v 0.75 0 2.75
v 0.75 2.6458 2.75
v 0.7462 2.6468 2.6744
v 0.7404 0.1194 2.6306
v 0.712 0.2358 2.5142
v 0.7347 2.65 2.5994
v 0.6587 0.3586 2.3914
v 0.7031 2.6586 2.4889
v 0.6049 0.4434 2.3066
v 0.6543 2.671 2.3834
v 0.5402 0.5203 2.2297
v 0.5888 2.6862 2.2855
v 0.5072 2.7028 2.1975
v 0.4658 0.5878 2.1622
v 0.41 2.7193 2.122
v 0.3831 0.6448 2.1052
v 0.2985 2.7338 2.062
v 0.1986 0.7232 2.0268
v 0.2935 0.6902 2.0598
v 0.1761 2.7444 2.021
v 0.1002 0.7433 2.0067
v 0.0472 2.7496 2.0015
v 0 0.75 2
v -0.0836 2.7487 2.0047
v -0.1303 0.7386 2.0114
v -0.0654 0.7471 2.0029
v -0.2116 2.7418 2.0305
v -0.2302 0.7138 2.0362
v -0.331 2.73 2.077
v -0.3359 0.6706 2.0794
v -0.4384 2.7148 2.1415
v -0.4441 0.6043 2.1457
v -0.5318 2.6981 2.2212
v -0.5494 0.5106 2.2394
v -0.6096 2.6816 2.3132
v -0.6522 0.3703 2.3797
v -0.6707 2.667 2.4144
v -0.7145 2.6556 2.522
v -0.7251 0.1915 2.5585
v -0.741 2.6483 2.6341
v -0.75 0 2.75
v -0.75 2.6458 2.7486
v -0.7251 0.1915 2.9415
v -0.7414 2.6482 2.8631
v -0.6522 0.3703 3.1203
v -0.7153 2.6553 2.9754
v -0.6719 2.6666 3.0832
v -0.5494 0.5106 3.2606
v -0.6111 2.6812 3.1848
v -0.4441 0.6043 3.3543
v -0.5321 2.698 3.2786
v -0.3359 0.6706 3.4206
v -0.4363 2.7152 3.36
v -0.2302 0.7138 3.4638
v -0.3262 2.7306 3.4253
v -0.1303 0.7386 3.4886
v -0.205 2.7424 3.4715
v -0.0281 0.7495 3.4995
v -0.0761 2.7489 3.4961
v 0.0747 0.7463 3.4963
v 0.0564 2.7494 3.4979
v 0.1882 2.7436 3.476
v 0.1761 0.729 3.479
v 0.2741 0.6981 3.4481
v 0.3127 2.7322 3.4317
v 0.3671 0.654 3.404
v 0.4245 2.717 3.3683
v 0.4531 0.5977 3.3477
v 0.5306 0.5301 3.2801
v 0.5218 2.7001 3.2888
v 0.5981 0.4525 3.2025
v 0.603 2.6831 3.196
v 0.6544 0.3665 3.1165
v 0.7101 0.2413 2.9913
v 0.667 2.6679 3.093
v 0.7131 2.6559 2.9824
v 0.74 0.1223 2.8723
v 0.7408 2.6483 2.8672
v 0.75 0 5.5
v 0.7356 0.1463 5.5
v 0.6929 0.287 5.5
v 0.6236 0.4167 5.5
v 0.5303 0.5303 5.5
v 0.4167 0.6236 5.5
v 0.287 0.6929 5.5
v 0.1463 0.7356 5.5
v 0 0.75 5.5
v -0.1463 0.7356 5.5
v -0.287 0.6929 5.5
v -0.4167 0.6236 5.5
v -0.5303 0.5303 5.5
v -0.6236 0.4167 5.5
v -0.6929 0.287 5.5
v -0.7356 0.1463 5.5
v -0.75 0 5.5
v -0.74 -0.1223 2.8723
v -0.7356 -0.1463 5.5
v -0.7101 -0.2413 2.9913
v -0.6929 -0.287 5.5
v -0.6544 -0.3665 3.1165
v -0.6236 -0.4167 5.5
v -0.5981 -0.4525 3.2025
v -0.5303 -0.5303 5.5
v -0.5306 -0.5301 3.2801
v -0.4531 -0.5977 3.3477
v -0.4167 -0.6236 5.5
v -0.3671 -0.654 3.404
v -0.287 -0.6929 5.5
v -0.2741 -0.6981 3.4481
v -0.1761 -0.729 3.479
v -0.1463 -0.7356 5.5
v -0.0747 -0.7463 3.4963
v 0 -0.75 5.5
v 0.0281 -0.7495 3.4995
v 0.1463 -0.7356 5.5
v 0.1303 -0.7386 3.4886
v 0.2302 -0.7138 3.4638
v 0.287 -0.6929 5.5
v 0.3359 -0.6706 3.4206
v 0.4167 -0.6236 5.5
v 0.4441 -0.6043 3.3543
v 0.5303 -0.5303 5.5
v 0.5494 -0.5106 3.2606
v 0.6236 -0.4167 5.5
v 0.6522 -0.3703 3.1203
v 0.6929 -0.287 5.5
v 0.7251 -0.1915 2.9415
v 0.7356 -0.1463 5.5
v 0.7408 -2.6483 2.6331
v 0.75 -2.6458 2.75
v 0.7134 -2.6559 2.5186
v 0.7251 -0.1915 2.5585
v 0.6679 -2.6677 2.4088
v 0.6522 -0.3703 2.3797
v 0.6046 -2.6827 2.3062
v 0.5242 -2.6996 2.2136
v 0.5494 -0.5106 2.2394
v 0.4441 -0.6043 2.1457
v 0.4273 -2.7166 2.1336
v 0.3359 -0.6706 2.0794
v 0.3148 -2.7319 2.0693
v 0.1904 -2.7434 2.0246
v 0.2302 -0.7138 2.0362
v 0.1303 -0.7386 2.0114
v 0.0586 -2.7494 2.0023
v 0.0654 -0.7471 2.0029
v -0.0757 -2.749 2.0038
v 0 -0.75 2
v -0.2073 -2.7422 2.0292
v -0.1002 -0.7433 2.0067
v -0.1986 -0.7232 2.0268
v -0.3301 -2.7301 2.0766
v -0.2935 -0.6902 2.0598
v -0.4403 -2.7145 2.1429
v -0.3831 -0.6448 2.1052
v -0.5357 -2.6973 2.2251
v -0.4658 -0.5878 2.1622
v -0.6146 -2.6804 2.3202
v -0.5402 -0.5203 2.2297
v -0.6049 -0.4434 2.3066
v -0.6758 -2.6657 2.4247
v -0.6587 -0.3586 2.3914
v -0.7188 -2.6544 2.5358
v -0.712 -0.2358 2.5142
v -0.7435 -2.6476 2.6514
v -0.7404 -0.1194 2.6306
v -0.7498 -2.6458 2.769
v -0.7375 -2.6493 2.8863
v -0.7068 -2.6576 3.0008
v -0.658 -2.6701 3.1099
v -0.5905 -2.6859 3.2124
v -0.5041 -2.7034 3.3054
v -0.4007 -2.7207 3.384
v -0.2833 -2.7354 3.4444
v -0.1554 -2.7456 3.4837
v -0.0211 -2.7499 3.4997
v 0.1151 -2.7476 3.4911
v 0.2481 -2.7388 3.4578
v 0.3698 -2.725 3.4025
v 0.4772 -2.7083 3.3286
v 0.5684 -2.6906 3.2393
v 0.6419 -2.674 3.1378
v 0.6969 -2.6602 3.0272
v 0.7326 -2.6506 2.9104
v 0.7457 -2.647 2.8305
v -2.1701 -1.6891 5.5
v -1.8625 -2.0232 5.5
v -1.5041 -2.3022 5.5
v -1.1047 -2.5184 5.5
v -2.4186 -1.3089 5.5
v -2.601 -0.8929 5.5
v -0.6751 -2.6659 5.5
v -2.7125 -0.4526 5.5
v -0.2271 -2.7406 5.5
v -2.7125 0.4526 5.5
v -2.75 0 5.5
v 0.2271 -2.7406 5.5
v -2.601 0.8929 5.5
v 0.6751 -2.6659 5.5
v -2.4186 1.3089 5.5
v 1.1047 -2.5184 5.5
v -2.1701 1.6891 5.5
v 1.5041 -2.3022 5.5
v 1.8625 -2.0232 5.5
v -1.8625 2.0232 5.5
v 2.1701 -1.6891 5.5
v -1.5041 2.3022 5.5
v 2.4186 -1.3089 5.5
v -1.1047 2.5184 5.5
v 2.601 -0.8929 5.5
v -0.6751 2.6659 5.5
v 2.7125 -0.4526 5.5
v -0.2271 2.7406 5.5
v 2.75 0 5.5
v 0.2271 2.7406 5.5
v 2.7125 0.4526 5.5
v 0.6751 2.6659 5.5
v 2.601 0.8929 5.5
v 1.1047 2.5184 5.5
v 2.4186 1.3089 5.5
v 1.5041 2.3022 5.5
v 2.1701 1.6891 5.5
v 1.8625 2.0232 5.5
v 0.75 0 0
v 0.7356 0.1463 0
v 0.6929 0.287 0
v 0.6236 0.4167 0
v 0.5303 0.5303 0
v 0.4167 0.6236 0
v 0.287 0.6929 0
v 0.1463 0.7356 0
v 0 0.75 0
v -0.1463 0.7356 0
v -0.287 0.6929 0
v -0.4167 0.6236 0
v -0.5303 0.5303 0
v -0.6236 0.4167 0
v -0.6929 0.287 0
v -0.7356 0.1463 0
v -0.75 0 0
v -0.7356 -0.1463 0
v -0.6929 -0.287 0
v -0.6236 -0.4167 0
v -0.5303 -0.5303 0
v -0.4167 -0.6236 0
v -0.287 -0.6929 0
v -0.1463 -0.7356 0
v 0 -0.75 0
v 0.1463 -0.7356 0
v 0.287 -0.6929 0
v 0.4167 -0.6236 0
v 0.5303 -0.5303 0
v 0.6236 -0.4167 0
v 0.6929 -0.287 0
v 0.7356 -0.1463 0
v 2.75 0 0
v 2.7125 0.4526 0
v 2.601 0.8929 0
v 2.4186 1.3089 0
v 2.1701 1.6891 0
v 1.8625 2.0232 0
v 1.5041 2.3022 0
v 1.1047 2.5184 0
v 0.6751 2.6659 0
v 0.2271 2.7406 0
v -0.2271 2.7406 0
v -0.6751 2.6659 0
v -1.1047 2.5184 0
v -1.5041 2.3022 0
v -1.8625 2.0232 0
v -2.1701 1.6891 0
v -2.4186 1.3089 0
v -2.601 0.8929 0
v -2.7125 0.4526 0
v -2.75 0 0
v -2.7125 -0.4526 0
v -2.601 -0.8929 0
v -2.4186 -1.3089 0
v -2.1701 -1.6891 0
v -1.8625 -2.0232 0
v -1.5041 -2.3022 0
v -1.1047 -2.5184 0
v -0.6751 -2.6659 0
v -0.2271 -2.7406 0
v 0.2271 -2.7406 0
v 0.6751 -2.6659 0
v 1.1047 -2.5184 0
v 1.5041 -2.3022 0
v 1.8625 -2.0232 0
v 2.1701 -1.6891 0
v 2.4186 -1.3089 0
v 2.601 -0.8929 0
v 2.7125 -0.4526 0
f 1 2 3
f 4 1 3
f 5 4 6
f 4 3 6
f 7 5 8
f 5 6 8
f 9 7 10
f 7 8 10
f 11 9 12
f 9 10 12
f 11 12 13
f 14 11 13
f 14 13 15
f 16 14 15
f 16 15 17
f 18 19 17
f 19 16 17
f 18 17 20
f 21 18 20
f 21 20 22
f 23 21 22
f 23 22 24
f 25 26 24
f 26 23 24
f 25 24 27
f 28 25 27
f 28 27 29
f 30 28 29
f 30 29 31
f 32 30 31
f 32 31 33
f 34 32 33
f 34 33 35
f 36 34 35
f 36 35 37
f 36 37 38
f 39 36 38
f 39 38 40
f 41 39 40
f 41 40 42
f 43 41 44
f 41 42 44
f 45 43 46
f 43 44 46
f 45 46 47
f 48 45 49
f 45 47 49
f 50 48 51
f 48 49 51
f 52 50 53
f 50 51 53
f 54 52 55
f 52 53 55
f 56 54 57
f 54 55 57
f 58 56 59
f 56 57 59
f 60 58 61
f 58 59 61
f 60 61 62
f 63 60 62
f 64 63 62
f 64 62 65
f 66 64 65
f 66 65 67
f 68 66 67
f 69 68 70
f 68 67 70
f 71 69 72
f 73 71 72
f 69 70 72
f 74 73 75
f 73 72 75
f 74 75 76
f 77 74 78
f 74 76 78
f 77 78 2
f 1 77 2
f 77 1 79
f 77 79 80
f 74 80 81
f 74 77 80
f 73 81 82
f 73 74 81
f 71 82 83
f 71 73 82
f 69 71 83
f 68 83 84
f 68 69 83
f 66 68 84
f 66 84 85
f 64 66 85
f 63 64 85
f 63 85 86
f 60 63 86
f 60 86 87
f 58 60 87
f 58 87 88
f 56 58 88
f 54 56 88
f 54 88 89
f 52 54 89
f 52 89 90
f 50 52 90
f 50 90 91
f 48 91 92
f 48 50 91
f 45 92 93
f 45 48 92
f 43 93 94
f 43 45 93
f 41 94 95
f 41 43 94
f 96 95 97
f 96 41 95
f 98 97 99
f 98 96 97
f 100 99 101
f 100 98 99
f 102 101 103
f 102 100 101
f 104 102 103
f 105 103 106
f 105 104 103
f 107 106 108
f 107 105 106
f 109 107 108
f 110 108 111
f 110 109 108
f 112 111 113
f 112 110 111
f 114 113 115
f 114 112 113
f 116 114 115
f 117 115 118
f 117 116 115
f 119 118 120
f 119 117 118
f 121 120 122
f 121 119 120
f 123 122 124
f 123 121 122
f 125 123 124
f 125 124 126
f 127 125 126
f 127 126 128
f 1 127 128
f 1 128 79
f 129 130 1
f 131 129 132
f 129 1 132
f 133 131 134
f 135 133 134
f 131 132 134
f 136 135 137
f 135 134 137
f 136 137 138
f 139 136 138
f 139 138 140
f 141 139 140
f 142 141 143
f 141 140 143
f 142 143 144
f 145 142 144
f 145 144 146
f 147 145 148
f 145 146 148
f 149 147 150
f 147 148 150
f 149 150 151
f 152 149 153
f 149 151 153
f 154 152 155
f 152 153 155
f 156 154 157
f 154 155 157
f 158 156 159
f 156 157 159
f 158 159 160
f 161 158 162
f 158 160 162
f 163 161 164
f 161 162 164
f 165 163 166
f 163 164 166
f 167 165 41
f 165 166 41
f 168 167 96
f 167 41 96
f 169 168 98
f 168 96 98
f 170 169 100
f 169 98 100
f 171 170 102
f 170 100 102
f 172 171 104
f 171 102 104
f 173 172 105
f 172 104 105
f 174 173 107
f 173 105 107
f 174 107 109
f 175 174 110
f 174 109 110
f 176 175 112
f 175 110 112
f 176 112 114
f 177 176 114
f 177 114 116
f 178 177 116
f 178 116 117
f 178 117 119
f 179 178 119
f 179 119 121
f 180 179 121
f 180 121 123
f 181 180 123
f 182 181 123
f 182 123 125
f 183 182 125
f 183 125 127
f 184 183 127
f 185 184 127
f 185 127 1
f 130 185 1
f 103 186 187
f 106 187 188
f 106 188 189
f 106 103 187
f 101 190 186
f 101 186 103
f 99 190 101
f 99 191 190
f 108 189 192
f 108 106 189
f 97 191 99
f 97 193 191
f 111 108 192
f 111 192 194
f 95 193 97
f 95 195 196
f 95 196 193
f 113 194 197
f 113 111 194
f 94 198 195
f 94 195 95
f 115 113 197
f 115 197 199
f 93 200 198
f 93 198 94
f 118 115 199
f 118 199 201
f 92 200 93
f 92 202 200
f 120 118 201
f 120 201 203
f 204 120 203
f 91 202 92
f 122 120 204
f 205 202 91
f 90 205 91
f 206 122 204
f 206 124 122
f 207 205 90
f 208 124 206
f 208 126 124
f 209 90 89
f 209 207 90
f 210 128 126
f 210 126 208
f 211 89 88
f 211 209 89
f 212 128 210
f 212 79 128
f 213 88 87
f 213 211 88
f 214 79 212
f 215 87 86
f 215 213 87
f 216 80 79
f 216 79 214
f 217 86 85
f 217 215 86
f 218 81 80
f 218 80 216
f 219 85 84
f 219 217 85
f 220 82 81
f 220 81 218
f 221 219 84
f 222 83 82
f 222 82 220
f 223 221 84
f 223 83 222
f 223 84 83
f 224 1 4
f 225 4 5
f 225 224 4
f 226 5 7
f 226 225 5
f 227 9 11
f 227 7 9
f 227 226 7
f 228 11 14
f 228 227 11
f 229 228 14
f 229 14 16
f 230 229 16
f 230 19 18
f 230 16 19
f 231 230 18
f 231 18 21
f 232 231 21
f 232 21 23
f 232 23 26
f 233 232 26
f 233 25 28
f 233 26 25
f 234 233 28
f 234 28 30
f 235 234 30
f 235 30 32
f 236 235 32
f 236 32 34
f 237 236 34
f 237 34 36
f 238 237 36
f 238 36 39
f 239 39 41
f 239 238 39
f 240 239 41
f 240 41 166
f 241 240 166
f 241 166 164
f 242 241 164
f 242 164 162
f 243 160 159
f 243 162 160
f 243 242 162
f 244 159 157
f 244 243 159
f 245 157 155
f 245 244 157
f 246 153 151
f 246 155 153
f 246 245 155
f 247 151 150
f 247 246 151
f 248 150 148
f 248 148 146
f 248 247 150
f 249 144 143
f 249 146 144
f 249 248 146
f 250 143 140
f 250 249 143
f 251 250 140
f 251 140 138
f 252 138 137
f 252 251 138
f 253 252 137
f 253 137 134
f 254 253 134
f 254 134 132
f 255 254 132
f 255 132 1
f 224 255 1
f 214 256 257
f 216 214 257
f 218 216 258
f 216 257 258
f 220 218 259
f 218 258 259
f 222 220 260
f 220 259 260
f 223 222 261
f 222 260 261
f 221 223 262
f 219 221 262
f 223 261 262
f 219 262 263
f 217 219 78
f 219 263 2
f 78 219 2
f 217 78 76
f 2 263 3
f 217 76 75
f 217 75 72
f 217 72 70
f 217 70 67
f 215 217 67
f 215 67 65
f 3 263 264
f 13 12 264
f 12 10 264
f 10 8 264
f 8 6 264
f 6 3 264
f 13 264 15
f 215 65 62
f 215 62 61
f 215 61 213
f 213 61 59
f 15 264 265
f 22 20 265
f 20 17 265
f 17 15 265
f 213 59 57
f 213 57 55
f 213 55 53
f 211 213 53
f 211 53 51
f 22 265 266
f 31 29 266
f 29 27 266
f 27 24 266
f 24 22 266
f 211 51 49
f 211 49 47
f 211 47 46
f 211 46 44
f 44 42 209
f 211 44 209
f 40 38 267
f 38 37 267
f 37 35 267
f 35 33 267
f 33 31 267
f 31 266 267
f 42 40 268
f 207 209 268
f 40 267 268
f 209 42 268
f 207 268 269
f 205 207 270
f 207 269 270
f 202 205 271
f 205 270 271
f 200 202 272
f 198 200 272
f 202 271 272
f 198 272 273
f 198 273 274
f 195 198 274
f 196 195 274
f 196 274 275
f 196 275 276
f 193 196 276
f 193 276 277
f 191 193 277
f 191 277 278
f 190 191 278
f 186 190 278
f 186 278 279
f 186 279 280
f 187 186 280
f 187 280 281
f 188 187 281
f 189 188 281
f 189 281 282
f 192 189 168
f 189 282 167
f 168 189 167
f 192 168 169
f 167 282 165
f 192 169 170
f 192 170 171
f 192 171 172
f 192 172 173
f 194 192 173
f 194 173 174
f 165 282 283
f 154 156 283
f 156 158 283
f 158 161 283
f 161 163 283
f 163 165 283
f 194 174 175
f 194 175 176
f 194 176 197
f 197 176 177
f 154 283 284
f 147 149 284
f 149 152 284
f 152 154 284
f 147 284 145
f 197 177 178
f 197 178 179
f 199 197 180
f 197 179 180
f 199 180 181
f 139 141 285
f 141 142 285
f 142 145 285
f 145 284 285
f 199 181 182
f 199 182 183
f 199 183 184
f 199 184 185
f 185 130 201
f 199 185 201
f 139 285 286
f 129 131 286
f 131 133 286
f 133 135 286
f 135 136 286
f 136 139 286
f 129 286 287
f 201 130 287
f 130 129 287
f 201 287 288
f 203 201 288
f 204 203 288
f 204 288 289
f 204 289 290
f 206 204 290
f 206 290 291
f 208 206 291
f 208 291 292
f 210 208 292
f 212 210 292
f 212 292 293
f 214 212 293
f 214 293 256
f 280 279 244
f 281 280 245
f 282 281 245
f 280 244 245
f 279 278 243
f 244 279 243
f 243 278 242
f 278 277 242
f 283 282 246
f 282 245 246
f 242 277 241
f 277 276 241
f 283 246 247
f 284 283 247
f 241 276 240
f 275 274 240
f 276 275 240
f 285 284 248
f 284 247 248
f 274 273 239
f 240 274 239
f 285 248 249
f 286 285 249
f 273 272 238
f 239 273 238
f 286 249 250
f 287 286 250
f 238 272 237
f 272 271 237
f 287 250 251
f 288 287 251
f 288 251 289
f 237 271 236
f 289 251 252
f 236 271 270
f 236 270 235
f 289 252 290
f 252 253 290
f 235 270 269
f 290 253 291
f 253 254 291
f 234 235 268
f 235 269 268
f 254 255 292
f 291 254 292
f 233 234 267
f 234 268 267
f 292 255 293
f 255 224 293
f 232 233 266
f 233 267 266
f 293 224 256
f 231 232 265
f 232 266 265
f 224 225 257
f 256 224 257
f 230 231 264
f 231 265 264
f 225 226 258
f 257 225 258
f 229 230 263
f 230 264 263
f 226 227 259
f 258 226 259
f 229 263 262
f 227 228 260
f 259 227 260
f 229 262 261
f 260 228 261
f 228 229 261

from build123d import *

# Parameters (mm, degrees)
SKETCH_1_R          = 2.75
SKETCH_1_R_2        = 0.75
EXTRUDE_1_DEPTH     = 5.5
SKETCH_2_R          = 0.75
CUT_EXTRUDE_1_DEPTH = 2.75


with BuildPart() as part:
    # 草图1 → 凸台-拉伸1 (new body)
    with BuildSketch(Plane.XY):
        Circle(SKETCH_1_R)
        Circle(SKETCH_1_R_2, mode=Mode.SUBTRACT)
    extrude(amount=EXTRUDE_1_DEPTH)

    # 草图2 → 切除-拉伸1 (cut, symmetric)
    with BuildSketch(Plane(origin=(0, 0, 0), x_dir=(1, 0, 0), z_dir=(0, 1, 0))):
        with Locations((0, -2.75)):
            Circle(SKETCH_2_R)
    extrude(amount=CUT_EXTRUDE_1_DEPTH, both=True, mode=Mode.SUBTRACT)


solid = part.part
